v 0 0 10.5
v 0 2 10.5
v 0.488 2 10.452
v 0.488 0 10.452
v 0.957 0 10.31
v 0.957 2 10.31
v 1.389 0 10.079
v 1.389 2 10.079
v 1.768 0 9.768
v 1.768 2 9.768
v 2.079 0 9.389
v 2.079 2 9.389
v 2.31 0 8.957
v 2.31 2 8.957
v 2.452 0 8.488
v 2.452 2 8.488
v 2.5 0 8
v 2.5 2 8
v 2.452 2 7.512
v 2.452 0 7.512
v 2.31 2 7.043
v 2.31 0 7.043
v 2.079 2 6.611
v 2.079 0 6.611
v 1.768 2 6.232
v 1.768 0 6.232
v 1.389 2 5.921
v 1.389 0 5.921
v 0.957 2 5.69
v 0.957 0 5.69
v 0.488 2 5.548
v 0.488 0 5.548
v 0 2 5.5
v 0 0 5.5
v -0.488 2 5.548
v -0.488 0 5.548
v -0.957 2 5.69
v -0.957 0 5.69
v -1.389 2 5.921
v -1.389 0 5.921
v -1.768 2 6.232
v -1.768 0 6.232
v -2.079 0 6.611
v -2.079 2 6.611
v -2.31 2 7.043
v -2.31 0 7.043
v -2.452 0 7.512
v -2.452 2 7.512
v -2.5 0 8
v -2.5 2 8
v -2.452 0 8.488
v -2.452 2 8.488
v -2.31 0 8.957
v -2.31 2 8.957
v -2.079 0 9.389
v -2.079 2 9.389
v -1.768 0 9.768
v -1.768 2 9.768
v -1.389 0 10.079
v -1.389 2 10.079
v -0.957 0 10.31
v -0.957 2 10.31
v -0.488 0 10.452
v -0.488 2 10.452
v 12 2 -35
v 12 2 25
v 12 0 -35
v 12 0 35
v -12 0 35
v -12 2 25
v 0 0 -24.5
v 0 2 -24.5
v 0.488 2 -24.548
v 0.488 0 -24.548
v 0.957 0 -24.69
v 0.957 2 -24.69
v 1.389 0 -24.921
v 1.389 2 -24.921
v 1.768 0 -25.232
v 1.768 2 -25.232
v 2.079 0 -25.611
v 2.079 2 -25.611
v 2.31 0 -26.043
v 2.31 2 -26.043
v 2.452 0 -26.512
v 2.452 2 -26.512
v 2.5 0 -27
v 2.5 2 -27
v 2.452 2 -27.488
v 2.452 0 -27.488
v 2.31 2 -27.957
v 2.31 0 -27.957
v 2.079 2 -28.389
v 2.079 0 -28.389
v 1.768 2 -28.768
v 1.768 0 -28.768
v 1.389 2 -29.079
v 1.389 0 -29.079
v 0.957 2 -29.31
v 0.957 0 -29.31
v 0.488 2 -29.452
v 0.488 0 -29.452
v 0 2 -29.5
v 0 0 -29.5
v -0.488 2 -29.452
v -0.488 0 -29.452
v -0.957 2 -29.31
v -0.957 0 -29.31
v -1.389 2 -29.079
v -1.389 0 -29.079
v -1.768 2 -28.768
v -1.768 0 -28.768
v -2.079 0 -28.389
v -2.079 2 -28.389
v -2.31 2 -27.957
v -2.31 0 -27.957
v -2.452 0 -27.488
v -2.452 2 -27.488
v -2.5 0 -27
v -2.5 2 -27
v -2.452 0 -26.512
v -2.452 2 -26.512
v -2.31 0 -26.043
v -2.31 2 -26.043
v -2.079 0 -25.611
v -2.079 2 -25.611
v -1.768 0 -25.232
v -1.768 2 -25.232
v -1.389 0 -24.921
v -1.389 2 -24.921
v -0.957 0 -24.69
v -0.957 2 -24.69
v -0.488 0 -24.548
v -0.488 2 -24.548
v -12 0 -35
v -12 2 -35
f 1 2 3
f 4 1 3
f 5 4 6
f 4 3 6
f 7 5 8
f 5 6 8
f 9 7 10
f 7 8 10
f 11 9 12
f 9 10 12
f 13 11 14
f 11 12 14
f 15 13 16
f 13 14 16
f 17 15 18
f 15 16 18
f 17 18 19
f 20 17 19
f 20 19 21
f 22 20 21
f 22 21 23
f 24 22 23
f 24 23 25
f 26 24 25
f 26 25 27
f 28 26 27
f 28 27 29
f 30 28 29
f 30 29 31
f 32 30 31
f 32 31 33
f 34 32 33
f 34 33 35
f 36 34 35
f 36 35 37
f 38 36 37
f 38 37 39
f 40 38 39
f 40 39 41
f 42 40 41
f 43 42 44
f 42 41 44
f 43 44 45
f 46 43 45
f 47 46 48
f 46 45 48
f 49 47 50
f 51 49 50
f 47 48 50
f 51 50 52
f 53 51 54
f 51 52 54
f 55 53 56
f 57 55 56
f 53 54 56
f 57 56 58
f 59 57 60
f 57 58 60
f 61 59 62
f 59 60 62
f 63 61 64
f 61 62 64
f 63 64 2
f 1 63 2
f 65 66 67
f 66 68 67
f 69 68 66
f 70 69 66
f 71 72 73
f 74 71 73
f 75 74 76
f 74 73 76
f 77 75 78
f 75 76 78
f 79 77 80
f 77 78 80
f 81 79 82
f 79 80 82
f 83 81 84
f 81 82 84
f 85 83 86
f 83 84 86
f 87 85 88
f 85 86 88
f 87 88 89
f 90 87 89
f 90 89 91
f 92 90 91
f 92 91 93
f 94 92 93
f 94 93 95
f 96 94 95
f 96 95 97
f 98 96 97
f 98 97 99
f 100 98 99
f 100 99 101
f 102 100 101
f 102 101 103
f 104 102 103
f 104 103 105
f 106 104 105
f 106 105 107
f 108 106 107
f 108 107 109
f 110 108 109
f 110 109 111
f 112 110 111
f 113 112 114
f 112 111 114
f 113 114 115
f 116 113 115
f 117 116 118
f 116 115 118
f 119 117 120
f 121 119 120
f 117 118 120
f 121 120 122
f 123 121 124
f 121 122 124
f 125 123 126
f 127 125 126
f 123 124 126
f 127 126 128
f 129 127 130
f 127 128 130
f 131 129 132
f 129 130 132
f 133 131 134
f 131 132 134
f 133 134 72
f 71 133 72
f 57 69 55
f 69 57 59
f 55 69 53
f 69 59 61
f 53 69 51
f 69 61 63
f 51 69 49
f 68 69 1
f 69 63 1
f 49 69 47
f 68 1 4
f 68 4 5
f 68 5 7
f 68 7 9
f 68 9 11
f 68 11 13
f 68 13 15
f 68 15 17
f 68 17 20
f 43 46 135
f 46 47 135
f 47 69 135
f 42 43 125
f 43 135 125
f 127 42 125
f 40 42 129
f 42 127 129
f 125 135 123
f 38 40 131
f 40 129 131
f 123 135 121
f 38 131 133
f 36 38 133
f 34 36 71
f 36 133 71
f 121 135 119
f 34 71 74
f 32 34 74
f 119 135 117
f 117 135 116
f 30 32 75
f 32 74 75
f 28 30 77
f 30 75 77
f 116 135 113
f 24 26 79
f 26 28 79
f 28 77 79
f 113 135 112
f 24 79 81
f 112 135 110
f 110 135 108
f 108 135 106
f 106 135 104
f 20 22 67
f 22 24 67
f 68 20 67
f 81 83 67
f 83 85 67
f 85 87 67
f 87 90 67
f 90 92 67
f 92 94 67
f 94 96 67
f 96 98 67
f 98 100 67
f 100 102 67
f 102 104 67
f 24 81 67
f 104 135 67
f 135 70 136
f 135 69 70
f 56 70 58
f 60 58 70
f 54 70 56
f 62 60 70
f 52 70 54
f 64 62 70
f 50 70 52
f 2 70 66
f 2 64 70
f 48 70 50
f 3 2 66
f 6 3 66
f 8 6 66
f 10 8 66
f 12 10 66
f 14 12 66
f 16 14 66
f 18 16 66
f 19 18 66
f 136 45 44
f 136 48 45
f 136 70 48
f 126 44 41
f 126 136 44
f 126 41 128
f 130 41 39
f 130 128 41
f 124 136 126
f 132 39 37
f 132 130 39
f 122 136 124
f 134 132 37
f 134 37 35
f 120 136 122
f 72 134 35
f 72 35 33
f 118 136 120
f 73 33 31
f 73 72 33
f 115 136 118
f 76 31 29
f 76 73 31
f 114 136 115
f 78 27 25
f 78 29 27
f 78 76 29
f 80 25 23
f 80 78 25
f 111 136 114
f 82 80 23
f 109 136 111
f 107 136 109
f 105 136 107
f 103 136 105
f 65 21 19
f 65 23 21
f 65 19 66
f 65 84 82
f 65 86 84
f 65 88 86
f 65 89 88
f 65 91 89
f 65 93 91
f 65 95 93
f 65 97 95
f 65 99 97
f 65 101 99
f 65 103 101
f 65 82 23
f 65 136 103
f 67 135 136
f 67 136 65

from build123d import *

# Parameters (mm, degrees)
SKETCH_1_W               = 24
SKETCH_1_H               = 70
EXTRUDE_1_DEPTH          = 2
SKETCH_2_R               = 2.5
CUT_EXTRUDE_1_DEPTH      = 38.054014627
CUT_EXTRUDE_2_DEPTH      = 43.485291572
CUT_EXTRUDE_2_DEPTH_BACK = 43.485291572


with BuildPart() as part:
    # 草图1 → 凸台-拉伸1 (new body)
    with BuildSketch(Plane(origin=(0, 0, 0), x_dir=(1, 0, 0), z_dir=(0, 1, 0))):
        Rectangle(SKETCH_1_W, SKETCH_1_H)
    extrude(amount=EXTRUDE_1_DEPTH)

    # 草图2 → 切除-拉伸1 (cut, through all)
    with BuildSketch(Plane(origin=(0, 2, 0), x_dir=(1, 0, 0), z_dir=(0, 1, 0))):
        with Locations(Location((0, -8, 0), (0, 0, 270))):
            Circle(SKETCH_2_R)
        with Locations(Location((0, 27, 0), (0, 0, 270))):
            Circle(SKETCH_2_R)
    extrude(amount=-CUT_EXTRUDE_1_DEPTH, mode=Mode.SUBTRACT)

    # 草图3 → 切除-拉伸2 (cut, two sides: drawn at the far end of the back side and taken through both)
    with BuildSketch(Plane(origin=(12, 0, 0), x_dir=(0, 0, -1), z_dir=(1, 0, 0)).offset(-CUT_EXTRUDE_2_DEPTH_BACK)):
        Polygon((-182.143123104, -29.428624621), (-35, 0), (-25, 2), (122.143123104, 31.428624621), (63.285873863, 325.71487083), (-241.000372346, 264.857621588), align=None)
    extrude(amount=CUT_EXTRUDE_2_DEPTH + CUT_EXTRUDE_2_DEPTH_BACK, mode=Mode.SUBTRACT)


solid = part.part
